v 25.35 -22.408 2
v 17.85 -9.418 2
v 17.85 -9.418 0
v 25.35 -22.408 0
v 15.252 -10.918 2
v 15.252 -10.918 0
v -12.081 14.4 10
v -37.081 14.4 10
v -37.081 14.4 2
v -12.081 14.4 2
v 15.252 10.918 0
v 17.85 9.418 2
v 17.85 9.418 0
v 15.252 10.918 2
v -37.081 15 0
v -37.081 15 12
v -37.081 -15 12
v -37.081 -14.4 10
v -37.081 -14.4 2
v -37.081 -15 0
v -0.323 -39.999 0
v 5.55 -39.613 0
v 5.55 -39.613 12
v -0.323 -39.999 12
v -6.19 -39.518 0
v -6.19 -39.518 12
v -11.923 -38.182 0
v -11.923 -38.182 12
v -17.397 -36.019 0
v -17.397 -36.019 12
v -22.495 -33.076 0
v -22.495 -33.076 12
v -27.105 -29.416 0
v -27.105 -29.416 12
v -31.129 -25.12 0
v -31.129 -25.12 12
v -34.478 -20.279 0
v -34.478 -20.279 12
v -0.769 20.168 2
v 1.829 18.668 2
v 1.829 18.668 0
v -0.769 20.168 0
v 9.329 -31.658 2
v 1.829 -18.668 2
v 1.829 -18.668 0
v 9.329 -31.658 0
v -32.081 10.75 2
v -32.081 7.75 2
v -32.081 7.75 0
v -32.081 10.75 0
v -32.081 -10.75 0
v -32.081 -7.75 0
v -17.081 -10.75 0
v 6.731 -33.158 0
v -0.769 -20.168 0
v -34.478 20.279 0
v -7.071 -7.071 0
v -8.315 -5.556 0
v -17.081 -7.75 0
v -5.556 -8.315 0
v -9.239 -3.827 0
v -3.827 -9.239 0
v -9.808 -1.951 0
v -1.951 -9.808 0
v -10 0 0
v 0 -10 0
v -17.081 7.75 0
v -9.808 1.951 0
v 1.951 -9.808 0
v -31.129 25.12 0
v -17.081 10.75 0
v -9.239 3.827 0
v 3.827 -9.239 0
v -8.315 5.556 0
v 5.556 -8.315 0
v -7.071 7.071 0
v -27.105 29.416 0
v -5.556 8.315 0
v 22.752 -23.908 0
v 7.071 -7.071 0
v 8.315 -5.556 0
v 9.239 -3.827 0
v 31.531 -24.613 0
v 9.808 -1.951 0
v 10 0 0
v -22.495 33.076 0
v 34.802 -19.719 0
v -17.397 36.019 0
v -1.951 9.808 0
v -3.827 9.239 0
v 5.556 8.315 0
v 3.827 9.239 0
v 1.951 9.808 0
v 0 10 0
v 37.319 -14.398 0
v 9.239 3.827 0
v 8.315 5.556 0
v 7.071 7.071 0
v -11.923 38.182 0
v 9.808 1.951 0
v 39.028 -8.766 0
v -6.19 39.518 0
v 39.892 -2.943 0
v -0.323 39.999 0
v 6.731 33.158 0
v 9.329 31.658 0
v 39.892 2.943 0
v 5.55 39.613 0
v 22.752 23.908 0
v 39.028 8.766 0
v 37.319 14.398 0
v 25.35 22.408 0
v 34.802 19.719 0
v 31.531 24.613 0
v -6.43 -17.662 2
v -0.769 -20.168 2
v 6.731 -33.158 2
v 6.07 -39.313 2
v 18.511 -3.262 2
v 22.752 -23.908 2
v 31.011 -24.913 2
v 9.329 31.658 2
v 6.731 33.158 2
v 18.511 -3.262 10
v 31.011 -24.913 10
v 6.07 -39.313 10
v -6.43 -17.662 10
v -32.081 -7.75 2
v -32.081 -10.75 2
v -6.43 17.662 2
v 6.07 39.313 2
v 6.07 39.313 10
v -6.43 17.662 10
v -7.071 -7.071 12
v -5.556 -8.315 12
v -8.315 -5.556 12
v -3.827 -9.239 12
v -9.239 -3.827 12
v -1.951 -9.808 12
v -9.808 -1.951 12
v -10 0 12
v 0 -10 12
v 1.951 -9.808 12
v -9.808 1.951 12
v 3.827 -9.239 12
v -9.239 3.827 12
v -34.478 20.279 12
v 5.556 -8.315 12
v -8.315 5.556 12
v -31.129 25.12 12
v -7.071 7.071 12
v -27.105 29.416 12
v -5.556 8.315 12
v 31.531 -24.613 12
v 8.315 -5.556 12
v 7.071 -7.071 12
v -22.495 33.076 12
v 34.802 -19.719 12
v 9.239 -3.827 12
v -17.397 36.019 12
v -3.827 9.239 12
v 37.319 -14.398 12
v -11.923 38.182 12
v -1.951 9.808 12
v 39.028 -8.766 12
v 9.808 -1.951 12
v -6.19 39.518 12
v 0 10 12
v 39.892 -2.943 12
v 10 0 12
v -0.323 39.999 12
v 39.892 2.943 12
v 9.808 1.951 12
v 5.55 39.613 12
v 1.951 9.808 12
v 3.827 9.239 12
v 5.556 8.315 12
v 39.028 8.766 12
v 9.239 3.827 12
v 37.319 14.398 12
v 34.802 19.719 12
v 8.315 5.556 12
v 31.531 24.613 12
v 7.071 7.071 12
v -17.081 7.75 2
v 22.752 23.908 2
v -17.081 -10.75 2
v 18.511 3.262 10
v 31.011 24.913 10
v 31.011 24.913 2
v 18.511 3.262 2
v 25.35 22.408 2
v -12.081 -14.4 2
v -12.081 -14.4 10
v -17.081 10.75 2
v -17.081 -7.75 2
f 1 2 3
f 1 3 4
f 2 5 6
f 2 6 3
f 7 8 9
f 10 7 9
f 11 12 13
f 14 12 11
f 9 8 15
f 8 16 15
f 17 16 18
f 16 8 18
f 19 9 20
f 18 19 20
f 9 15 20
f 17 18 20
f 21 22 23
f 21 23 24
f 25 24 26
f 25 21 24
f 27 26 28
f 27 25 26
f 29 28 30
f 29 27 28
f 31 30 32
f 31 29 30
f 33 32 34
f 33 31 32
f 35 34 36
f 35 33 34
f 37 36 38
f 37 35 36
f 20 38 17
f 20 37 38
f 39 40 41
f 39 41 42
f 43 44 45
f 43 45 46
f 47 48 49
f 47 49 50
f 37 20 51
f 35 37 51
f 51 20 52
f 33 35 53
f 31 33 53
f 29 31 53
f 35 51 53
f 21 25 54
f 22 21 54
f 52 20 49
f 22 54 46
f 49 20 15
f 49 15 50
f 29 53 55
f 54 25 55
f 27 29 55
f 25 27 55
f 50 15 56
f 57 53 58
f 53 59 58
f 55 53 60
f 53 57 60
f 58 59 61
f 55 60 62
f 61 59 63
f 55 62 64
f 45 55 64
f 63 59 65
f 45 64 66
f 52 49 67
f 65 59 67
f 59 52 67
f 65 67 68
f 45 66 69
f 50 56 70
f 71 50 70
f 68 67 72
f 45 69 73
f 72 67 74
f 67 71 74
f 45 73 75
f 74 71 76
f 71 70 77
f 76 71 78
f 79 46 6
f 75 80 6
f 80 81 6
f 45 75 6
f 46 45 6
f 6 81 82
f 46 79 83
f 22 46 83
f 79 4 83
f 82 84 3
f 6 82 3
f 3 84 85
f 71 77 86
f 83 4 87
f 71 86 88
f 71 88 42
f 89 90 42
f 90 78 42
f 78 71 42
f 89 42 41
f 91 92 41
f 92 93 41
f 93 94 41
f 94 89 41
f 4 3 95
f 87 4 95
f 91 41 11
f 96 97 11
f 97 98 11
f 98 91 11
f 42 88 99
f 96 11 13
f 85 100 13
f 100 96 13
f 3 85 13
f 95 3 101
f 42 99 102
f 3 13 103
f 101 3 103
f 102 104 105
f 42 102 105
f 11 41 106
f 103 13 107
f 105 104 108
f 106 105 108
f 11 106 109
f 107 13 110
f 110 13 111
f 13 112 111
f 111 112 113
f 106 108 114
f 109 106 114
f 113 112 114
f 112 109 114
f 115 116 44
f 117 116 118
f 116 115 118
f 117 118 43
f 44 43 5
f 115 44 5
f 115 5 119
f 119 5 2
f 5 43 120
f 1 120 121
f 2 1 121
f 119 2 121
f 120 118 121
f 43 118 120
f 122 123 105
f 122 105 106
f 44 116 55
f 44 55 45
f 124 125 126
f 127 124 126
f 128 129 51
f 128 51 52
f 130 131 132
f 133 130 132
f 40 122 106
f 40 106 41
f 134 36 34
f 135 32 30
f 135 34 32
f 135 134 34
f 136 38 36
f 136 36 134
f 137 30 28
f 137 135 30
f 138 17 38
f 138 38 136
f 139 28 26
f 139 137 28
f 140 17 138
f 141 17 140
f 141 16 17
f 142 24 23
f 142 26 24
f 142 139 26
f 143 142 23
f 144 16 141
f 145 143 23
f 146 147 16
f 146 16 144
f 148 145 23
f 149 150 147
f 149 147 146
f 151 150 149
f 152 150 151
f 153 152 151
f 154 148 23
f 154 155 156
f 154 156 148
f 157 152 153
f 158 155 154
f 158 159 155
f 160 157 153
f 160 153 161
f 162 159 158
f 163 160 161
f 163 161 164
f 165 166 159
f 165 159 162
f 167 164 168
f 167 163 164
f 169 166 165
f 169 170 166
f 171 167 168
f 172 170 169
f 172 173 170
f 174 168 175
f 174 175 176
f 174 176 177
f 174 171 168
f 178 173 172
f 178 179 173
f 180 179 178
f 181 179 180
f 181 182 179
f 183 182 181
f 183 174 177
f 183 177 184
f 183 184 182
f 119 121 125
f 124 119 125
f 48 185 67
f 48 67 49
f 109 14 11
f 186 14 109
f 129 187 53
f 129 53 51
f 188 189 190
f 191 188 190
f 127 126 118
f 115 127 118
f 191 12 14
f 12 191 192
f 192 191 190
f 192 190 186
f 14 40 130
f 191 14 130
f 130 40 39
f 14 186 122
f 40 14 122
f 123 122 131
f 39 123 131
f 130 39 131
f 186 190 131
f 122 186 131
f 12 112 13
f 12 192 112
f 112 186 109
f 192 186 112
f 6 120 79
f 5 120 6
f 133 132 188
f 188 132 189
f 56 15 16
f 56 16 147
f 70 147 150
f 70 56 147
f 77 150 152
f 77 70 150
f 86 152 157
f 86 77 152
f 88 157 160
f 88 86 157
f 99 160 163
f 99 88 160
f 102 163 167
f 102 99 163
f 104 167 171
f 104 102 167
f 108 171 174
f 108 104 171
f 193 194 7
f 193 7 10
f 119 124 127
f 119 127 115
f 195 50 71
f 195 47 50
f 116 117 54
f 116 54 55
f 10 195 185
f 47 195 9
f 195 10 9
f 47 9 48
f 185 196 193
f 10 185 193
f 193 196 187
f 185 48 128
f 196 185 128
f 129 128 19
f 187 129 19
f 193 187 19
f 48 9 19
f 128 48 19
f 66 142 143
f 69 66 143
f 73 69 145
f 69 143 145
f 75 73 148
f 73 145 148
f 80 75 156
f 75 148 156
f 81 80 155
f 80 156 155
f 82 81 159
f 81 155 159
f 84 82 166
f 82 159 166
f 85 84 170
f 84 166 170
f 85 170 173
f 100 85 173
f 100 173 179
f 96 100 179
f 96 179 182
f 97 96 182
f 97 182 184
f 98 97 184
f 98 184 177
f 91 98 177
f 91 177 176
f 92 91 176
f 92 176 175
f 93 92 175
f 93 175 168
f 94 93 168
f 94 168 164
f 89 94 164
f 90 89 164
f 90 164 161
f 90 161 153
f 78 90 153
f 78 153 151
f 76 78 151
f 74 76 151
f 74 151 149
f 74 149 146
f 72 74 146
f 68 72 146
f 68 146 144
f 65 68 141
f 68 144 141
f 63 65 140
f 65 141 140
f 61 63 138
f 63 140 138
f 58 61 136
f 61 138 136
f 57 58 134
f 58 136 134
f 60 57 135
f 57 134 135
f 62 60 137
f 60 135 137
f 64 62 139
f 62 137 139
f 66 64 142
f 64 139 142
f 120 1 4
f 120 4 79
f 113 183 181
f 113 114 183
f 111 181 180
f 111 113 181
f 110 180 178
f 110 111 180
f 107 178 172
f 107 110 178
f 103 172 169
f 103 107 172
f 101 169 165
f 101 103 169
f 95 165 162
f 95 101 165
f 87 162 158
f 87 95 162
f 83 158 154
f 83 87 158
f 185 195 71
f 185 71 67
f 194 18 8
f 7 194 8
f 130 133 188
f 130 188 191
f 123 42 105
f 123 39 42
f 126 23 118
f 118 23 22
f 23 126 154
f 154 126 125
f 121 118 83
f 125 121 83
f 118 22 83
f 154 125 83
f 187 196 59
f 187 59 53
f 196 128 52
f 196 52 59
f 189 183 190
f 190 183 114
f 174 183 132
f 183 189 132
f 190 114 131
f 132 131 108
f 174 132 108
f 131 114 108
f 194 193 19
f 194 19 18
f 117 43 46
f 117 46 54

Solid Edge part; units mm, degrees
sketch "Sketch1" plane through (0, 0, 0) normal (0, 0, 1) x (1, 0, 0)
  circle A0 centre (0, 0) radius 40
  dimension "D1" = 80
extrude "Protrusion1" add sketch "Sketch1" along normal blind 12
hole "Bohrung_1" at (0, 0, 12) direction (0, 0, -1) diameter 20 end through all
sketch "Sketch2" plane through (0, 0, 0) normal (0, 0, 1) x (1, 0, 0)
  line L0 (-37.081, 15) -> (-37.081, -15)
extrude "Cutout1" cut sketch "Sketch2" along normal through all material side at (-37.131, 0, 0)
sketch "Sketch3" plane through (-37.081, 0, 6) normal (-1, 0, 0) x (0, -1, 0)
  line L0 (14.4, 4) -> (-14.4, 4)
  line L1 (-14.4, 4) -> (-14.4, -4)
  line L2 (-14.4, -4) -> (14.4, -4)
  line L3 (14.4, -4) -> (14.4, 4)
extrude "Extrusionsausschnitt_5" cut sketch "Sketch3" against normal blind 25
sketch "Sketch4" plane through (-24.581, 0, 2) normal (0, 0, 1) x (0, -1, 0)
  line L0 (-7.75, 7.5) -> (-7.75, -7.5)
  line L1 (-7.75, -7.5) -> (-10.75, -7.5)
  line L2 (-10.75, -7.5) -> (-10.75, 7.5)
  line L3 (-10.75, 7.5) -> (-7.75, 7.5)
extrude "Cutout2" cut sketch "Sketch4" against normal through all
mirror "Mirror1" about plane through (0, 0, 0) normal (0, -1, 0) of "Cutout2"
pattern_circular "Pattern1" count 3 over 360 about axis through (0, 0, 0) along (0, 0, -1) of "Mirror1", "Cutout2", "Extrusionsausschnitt_5", "Cutout1"
